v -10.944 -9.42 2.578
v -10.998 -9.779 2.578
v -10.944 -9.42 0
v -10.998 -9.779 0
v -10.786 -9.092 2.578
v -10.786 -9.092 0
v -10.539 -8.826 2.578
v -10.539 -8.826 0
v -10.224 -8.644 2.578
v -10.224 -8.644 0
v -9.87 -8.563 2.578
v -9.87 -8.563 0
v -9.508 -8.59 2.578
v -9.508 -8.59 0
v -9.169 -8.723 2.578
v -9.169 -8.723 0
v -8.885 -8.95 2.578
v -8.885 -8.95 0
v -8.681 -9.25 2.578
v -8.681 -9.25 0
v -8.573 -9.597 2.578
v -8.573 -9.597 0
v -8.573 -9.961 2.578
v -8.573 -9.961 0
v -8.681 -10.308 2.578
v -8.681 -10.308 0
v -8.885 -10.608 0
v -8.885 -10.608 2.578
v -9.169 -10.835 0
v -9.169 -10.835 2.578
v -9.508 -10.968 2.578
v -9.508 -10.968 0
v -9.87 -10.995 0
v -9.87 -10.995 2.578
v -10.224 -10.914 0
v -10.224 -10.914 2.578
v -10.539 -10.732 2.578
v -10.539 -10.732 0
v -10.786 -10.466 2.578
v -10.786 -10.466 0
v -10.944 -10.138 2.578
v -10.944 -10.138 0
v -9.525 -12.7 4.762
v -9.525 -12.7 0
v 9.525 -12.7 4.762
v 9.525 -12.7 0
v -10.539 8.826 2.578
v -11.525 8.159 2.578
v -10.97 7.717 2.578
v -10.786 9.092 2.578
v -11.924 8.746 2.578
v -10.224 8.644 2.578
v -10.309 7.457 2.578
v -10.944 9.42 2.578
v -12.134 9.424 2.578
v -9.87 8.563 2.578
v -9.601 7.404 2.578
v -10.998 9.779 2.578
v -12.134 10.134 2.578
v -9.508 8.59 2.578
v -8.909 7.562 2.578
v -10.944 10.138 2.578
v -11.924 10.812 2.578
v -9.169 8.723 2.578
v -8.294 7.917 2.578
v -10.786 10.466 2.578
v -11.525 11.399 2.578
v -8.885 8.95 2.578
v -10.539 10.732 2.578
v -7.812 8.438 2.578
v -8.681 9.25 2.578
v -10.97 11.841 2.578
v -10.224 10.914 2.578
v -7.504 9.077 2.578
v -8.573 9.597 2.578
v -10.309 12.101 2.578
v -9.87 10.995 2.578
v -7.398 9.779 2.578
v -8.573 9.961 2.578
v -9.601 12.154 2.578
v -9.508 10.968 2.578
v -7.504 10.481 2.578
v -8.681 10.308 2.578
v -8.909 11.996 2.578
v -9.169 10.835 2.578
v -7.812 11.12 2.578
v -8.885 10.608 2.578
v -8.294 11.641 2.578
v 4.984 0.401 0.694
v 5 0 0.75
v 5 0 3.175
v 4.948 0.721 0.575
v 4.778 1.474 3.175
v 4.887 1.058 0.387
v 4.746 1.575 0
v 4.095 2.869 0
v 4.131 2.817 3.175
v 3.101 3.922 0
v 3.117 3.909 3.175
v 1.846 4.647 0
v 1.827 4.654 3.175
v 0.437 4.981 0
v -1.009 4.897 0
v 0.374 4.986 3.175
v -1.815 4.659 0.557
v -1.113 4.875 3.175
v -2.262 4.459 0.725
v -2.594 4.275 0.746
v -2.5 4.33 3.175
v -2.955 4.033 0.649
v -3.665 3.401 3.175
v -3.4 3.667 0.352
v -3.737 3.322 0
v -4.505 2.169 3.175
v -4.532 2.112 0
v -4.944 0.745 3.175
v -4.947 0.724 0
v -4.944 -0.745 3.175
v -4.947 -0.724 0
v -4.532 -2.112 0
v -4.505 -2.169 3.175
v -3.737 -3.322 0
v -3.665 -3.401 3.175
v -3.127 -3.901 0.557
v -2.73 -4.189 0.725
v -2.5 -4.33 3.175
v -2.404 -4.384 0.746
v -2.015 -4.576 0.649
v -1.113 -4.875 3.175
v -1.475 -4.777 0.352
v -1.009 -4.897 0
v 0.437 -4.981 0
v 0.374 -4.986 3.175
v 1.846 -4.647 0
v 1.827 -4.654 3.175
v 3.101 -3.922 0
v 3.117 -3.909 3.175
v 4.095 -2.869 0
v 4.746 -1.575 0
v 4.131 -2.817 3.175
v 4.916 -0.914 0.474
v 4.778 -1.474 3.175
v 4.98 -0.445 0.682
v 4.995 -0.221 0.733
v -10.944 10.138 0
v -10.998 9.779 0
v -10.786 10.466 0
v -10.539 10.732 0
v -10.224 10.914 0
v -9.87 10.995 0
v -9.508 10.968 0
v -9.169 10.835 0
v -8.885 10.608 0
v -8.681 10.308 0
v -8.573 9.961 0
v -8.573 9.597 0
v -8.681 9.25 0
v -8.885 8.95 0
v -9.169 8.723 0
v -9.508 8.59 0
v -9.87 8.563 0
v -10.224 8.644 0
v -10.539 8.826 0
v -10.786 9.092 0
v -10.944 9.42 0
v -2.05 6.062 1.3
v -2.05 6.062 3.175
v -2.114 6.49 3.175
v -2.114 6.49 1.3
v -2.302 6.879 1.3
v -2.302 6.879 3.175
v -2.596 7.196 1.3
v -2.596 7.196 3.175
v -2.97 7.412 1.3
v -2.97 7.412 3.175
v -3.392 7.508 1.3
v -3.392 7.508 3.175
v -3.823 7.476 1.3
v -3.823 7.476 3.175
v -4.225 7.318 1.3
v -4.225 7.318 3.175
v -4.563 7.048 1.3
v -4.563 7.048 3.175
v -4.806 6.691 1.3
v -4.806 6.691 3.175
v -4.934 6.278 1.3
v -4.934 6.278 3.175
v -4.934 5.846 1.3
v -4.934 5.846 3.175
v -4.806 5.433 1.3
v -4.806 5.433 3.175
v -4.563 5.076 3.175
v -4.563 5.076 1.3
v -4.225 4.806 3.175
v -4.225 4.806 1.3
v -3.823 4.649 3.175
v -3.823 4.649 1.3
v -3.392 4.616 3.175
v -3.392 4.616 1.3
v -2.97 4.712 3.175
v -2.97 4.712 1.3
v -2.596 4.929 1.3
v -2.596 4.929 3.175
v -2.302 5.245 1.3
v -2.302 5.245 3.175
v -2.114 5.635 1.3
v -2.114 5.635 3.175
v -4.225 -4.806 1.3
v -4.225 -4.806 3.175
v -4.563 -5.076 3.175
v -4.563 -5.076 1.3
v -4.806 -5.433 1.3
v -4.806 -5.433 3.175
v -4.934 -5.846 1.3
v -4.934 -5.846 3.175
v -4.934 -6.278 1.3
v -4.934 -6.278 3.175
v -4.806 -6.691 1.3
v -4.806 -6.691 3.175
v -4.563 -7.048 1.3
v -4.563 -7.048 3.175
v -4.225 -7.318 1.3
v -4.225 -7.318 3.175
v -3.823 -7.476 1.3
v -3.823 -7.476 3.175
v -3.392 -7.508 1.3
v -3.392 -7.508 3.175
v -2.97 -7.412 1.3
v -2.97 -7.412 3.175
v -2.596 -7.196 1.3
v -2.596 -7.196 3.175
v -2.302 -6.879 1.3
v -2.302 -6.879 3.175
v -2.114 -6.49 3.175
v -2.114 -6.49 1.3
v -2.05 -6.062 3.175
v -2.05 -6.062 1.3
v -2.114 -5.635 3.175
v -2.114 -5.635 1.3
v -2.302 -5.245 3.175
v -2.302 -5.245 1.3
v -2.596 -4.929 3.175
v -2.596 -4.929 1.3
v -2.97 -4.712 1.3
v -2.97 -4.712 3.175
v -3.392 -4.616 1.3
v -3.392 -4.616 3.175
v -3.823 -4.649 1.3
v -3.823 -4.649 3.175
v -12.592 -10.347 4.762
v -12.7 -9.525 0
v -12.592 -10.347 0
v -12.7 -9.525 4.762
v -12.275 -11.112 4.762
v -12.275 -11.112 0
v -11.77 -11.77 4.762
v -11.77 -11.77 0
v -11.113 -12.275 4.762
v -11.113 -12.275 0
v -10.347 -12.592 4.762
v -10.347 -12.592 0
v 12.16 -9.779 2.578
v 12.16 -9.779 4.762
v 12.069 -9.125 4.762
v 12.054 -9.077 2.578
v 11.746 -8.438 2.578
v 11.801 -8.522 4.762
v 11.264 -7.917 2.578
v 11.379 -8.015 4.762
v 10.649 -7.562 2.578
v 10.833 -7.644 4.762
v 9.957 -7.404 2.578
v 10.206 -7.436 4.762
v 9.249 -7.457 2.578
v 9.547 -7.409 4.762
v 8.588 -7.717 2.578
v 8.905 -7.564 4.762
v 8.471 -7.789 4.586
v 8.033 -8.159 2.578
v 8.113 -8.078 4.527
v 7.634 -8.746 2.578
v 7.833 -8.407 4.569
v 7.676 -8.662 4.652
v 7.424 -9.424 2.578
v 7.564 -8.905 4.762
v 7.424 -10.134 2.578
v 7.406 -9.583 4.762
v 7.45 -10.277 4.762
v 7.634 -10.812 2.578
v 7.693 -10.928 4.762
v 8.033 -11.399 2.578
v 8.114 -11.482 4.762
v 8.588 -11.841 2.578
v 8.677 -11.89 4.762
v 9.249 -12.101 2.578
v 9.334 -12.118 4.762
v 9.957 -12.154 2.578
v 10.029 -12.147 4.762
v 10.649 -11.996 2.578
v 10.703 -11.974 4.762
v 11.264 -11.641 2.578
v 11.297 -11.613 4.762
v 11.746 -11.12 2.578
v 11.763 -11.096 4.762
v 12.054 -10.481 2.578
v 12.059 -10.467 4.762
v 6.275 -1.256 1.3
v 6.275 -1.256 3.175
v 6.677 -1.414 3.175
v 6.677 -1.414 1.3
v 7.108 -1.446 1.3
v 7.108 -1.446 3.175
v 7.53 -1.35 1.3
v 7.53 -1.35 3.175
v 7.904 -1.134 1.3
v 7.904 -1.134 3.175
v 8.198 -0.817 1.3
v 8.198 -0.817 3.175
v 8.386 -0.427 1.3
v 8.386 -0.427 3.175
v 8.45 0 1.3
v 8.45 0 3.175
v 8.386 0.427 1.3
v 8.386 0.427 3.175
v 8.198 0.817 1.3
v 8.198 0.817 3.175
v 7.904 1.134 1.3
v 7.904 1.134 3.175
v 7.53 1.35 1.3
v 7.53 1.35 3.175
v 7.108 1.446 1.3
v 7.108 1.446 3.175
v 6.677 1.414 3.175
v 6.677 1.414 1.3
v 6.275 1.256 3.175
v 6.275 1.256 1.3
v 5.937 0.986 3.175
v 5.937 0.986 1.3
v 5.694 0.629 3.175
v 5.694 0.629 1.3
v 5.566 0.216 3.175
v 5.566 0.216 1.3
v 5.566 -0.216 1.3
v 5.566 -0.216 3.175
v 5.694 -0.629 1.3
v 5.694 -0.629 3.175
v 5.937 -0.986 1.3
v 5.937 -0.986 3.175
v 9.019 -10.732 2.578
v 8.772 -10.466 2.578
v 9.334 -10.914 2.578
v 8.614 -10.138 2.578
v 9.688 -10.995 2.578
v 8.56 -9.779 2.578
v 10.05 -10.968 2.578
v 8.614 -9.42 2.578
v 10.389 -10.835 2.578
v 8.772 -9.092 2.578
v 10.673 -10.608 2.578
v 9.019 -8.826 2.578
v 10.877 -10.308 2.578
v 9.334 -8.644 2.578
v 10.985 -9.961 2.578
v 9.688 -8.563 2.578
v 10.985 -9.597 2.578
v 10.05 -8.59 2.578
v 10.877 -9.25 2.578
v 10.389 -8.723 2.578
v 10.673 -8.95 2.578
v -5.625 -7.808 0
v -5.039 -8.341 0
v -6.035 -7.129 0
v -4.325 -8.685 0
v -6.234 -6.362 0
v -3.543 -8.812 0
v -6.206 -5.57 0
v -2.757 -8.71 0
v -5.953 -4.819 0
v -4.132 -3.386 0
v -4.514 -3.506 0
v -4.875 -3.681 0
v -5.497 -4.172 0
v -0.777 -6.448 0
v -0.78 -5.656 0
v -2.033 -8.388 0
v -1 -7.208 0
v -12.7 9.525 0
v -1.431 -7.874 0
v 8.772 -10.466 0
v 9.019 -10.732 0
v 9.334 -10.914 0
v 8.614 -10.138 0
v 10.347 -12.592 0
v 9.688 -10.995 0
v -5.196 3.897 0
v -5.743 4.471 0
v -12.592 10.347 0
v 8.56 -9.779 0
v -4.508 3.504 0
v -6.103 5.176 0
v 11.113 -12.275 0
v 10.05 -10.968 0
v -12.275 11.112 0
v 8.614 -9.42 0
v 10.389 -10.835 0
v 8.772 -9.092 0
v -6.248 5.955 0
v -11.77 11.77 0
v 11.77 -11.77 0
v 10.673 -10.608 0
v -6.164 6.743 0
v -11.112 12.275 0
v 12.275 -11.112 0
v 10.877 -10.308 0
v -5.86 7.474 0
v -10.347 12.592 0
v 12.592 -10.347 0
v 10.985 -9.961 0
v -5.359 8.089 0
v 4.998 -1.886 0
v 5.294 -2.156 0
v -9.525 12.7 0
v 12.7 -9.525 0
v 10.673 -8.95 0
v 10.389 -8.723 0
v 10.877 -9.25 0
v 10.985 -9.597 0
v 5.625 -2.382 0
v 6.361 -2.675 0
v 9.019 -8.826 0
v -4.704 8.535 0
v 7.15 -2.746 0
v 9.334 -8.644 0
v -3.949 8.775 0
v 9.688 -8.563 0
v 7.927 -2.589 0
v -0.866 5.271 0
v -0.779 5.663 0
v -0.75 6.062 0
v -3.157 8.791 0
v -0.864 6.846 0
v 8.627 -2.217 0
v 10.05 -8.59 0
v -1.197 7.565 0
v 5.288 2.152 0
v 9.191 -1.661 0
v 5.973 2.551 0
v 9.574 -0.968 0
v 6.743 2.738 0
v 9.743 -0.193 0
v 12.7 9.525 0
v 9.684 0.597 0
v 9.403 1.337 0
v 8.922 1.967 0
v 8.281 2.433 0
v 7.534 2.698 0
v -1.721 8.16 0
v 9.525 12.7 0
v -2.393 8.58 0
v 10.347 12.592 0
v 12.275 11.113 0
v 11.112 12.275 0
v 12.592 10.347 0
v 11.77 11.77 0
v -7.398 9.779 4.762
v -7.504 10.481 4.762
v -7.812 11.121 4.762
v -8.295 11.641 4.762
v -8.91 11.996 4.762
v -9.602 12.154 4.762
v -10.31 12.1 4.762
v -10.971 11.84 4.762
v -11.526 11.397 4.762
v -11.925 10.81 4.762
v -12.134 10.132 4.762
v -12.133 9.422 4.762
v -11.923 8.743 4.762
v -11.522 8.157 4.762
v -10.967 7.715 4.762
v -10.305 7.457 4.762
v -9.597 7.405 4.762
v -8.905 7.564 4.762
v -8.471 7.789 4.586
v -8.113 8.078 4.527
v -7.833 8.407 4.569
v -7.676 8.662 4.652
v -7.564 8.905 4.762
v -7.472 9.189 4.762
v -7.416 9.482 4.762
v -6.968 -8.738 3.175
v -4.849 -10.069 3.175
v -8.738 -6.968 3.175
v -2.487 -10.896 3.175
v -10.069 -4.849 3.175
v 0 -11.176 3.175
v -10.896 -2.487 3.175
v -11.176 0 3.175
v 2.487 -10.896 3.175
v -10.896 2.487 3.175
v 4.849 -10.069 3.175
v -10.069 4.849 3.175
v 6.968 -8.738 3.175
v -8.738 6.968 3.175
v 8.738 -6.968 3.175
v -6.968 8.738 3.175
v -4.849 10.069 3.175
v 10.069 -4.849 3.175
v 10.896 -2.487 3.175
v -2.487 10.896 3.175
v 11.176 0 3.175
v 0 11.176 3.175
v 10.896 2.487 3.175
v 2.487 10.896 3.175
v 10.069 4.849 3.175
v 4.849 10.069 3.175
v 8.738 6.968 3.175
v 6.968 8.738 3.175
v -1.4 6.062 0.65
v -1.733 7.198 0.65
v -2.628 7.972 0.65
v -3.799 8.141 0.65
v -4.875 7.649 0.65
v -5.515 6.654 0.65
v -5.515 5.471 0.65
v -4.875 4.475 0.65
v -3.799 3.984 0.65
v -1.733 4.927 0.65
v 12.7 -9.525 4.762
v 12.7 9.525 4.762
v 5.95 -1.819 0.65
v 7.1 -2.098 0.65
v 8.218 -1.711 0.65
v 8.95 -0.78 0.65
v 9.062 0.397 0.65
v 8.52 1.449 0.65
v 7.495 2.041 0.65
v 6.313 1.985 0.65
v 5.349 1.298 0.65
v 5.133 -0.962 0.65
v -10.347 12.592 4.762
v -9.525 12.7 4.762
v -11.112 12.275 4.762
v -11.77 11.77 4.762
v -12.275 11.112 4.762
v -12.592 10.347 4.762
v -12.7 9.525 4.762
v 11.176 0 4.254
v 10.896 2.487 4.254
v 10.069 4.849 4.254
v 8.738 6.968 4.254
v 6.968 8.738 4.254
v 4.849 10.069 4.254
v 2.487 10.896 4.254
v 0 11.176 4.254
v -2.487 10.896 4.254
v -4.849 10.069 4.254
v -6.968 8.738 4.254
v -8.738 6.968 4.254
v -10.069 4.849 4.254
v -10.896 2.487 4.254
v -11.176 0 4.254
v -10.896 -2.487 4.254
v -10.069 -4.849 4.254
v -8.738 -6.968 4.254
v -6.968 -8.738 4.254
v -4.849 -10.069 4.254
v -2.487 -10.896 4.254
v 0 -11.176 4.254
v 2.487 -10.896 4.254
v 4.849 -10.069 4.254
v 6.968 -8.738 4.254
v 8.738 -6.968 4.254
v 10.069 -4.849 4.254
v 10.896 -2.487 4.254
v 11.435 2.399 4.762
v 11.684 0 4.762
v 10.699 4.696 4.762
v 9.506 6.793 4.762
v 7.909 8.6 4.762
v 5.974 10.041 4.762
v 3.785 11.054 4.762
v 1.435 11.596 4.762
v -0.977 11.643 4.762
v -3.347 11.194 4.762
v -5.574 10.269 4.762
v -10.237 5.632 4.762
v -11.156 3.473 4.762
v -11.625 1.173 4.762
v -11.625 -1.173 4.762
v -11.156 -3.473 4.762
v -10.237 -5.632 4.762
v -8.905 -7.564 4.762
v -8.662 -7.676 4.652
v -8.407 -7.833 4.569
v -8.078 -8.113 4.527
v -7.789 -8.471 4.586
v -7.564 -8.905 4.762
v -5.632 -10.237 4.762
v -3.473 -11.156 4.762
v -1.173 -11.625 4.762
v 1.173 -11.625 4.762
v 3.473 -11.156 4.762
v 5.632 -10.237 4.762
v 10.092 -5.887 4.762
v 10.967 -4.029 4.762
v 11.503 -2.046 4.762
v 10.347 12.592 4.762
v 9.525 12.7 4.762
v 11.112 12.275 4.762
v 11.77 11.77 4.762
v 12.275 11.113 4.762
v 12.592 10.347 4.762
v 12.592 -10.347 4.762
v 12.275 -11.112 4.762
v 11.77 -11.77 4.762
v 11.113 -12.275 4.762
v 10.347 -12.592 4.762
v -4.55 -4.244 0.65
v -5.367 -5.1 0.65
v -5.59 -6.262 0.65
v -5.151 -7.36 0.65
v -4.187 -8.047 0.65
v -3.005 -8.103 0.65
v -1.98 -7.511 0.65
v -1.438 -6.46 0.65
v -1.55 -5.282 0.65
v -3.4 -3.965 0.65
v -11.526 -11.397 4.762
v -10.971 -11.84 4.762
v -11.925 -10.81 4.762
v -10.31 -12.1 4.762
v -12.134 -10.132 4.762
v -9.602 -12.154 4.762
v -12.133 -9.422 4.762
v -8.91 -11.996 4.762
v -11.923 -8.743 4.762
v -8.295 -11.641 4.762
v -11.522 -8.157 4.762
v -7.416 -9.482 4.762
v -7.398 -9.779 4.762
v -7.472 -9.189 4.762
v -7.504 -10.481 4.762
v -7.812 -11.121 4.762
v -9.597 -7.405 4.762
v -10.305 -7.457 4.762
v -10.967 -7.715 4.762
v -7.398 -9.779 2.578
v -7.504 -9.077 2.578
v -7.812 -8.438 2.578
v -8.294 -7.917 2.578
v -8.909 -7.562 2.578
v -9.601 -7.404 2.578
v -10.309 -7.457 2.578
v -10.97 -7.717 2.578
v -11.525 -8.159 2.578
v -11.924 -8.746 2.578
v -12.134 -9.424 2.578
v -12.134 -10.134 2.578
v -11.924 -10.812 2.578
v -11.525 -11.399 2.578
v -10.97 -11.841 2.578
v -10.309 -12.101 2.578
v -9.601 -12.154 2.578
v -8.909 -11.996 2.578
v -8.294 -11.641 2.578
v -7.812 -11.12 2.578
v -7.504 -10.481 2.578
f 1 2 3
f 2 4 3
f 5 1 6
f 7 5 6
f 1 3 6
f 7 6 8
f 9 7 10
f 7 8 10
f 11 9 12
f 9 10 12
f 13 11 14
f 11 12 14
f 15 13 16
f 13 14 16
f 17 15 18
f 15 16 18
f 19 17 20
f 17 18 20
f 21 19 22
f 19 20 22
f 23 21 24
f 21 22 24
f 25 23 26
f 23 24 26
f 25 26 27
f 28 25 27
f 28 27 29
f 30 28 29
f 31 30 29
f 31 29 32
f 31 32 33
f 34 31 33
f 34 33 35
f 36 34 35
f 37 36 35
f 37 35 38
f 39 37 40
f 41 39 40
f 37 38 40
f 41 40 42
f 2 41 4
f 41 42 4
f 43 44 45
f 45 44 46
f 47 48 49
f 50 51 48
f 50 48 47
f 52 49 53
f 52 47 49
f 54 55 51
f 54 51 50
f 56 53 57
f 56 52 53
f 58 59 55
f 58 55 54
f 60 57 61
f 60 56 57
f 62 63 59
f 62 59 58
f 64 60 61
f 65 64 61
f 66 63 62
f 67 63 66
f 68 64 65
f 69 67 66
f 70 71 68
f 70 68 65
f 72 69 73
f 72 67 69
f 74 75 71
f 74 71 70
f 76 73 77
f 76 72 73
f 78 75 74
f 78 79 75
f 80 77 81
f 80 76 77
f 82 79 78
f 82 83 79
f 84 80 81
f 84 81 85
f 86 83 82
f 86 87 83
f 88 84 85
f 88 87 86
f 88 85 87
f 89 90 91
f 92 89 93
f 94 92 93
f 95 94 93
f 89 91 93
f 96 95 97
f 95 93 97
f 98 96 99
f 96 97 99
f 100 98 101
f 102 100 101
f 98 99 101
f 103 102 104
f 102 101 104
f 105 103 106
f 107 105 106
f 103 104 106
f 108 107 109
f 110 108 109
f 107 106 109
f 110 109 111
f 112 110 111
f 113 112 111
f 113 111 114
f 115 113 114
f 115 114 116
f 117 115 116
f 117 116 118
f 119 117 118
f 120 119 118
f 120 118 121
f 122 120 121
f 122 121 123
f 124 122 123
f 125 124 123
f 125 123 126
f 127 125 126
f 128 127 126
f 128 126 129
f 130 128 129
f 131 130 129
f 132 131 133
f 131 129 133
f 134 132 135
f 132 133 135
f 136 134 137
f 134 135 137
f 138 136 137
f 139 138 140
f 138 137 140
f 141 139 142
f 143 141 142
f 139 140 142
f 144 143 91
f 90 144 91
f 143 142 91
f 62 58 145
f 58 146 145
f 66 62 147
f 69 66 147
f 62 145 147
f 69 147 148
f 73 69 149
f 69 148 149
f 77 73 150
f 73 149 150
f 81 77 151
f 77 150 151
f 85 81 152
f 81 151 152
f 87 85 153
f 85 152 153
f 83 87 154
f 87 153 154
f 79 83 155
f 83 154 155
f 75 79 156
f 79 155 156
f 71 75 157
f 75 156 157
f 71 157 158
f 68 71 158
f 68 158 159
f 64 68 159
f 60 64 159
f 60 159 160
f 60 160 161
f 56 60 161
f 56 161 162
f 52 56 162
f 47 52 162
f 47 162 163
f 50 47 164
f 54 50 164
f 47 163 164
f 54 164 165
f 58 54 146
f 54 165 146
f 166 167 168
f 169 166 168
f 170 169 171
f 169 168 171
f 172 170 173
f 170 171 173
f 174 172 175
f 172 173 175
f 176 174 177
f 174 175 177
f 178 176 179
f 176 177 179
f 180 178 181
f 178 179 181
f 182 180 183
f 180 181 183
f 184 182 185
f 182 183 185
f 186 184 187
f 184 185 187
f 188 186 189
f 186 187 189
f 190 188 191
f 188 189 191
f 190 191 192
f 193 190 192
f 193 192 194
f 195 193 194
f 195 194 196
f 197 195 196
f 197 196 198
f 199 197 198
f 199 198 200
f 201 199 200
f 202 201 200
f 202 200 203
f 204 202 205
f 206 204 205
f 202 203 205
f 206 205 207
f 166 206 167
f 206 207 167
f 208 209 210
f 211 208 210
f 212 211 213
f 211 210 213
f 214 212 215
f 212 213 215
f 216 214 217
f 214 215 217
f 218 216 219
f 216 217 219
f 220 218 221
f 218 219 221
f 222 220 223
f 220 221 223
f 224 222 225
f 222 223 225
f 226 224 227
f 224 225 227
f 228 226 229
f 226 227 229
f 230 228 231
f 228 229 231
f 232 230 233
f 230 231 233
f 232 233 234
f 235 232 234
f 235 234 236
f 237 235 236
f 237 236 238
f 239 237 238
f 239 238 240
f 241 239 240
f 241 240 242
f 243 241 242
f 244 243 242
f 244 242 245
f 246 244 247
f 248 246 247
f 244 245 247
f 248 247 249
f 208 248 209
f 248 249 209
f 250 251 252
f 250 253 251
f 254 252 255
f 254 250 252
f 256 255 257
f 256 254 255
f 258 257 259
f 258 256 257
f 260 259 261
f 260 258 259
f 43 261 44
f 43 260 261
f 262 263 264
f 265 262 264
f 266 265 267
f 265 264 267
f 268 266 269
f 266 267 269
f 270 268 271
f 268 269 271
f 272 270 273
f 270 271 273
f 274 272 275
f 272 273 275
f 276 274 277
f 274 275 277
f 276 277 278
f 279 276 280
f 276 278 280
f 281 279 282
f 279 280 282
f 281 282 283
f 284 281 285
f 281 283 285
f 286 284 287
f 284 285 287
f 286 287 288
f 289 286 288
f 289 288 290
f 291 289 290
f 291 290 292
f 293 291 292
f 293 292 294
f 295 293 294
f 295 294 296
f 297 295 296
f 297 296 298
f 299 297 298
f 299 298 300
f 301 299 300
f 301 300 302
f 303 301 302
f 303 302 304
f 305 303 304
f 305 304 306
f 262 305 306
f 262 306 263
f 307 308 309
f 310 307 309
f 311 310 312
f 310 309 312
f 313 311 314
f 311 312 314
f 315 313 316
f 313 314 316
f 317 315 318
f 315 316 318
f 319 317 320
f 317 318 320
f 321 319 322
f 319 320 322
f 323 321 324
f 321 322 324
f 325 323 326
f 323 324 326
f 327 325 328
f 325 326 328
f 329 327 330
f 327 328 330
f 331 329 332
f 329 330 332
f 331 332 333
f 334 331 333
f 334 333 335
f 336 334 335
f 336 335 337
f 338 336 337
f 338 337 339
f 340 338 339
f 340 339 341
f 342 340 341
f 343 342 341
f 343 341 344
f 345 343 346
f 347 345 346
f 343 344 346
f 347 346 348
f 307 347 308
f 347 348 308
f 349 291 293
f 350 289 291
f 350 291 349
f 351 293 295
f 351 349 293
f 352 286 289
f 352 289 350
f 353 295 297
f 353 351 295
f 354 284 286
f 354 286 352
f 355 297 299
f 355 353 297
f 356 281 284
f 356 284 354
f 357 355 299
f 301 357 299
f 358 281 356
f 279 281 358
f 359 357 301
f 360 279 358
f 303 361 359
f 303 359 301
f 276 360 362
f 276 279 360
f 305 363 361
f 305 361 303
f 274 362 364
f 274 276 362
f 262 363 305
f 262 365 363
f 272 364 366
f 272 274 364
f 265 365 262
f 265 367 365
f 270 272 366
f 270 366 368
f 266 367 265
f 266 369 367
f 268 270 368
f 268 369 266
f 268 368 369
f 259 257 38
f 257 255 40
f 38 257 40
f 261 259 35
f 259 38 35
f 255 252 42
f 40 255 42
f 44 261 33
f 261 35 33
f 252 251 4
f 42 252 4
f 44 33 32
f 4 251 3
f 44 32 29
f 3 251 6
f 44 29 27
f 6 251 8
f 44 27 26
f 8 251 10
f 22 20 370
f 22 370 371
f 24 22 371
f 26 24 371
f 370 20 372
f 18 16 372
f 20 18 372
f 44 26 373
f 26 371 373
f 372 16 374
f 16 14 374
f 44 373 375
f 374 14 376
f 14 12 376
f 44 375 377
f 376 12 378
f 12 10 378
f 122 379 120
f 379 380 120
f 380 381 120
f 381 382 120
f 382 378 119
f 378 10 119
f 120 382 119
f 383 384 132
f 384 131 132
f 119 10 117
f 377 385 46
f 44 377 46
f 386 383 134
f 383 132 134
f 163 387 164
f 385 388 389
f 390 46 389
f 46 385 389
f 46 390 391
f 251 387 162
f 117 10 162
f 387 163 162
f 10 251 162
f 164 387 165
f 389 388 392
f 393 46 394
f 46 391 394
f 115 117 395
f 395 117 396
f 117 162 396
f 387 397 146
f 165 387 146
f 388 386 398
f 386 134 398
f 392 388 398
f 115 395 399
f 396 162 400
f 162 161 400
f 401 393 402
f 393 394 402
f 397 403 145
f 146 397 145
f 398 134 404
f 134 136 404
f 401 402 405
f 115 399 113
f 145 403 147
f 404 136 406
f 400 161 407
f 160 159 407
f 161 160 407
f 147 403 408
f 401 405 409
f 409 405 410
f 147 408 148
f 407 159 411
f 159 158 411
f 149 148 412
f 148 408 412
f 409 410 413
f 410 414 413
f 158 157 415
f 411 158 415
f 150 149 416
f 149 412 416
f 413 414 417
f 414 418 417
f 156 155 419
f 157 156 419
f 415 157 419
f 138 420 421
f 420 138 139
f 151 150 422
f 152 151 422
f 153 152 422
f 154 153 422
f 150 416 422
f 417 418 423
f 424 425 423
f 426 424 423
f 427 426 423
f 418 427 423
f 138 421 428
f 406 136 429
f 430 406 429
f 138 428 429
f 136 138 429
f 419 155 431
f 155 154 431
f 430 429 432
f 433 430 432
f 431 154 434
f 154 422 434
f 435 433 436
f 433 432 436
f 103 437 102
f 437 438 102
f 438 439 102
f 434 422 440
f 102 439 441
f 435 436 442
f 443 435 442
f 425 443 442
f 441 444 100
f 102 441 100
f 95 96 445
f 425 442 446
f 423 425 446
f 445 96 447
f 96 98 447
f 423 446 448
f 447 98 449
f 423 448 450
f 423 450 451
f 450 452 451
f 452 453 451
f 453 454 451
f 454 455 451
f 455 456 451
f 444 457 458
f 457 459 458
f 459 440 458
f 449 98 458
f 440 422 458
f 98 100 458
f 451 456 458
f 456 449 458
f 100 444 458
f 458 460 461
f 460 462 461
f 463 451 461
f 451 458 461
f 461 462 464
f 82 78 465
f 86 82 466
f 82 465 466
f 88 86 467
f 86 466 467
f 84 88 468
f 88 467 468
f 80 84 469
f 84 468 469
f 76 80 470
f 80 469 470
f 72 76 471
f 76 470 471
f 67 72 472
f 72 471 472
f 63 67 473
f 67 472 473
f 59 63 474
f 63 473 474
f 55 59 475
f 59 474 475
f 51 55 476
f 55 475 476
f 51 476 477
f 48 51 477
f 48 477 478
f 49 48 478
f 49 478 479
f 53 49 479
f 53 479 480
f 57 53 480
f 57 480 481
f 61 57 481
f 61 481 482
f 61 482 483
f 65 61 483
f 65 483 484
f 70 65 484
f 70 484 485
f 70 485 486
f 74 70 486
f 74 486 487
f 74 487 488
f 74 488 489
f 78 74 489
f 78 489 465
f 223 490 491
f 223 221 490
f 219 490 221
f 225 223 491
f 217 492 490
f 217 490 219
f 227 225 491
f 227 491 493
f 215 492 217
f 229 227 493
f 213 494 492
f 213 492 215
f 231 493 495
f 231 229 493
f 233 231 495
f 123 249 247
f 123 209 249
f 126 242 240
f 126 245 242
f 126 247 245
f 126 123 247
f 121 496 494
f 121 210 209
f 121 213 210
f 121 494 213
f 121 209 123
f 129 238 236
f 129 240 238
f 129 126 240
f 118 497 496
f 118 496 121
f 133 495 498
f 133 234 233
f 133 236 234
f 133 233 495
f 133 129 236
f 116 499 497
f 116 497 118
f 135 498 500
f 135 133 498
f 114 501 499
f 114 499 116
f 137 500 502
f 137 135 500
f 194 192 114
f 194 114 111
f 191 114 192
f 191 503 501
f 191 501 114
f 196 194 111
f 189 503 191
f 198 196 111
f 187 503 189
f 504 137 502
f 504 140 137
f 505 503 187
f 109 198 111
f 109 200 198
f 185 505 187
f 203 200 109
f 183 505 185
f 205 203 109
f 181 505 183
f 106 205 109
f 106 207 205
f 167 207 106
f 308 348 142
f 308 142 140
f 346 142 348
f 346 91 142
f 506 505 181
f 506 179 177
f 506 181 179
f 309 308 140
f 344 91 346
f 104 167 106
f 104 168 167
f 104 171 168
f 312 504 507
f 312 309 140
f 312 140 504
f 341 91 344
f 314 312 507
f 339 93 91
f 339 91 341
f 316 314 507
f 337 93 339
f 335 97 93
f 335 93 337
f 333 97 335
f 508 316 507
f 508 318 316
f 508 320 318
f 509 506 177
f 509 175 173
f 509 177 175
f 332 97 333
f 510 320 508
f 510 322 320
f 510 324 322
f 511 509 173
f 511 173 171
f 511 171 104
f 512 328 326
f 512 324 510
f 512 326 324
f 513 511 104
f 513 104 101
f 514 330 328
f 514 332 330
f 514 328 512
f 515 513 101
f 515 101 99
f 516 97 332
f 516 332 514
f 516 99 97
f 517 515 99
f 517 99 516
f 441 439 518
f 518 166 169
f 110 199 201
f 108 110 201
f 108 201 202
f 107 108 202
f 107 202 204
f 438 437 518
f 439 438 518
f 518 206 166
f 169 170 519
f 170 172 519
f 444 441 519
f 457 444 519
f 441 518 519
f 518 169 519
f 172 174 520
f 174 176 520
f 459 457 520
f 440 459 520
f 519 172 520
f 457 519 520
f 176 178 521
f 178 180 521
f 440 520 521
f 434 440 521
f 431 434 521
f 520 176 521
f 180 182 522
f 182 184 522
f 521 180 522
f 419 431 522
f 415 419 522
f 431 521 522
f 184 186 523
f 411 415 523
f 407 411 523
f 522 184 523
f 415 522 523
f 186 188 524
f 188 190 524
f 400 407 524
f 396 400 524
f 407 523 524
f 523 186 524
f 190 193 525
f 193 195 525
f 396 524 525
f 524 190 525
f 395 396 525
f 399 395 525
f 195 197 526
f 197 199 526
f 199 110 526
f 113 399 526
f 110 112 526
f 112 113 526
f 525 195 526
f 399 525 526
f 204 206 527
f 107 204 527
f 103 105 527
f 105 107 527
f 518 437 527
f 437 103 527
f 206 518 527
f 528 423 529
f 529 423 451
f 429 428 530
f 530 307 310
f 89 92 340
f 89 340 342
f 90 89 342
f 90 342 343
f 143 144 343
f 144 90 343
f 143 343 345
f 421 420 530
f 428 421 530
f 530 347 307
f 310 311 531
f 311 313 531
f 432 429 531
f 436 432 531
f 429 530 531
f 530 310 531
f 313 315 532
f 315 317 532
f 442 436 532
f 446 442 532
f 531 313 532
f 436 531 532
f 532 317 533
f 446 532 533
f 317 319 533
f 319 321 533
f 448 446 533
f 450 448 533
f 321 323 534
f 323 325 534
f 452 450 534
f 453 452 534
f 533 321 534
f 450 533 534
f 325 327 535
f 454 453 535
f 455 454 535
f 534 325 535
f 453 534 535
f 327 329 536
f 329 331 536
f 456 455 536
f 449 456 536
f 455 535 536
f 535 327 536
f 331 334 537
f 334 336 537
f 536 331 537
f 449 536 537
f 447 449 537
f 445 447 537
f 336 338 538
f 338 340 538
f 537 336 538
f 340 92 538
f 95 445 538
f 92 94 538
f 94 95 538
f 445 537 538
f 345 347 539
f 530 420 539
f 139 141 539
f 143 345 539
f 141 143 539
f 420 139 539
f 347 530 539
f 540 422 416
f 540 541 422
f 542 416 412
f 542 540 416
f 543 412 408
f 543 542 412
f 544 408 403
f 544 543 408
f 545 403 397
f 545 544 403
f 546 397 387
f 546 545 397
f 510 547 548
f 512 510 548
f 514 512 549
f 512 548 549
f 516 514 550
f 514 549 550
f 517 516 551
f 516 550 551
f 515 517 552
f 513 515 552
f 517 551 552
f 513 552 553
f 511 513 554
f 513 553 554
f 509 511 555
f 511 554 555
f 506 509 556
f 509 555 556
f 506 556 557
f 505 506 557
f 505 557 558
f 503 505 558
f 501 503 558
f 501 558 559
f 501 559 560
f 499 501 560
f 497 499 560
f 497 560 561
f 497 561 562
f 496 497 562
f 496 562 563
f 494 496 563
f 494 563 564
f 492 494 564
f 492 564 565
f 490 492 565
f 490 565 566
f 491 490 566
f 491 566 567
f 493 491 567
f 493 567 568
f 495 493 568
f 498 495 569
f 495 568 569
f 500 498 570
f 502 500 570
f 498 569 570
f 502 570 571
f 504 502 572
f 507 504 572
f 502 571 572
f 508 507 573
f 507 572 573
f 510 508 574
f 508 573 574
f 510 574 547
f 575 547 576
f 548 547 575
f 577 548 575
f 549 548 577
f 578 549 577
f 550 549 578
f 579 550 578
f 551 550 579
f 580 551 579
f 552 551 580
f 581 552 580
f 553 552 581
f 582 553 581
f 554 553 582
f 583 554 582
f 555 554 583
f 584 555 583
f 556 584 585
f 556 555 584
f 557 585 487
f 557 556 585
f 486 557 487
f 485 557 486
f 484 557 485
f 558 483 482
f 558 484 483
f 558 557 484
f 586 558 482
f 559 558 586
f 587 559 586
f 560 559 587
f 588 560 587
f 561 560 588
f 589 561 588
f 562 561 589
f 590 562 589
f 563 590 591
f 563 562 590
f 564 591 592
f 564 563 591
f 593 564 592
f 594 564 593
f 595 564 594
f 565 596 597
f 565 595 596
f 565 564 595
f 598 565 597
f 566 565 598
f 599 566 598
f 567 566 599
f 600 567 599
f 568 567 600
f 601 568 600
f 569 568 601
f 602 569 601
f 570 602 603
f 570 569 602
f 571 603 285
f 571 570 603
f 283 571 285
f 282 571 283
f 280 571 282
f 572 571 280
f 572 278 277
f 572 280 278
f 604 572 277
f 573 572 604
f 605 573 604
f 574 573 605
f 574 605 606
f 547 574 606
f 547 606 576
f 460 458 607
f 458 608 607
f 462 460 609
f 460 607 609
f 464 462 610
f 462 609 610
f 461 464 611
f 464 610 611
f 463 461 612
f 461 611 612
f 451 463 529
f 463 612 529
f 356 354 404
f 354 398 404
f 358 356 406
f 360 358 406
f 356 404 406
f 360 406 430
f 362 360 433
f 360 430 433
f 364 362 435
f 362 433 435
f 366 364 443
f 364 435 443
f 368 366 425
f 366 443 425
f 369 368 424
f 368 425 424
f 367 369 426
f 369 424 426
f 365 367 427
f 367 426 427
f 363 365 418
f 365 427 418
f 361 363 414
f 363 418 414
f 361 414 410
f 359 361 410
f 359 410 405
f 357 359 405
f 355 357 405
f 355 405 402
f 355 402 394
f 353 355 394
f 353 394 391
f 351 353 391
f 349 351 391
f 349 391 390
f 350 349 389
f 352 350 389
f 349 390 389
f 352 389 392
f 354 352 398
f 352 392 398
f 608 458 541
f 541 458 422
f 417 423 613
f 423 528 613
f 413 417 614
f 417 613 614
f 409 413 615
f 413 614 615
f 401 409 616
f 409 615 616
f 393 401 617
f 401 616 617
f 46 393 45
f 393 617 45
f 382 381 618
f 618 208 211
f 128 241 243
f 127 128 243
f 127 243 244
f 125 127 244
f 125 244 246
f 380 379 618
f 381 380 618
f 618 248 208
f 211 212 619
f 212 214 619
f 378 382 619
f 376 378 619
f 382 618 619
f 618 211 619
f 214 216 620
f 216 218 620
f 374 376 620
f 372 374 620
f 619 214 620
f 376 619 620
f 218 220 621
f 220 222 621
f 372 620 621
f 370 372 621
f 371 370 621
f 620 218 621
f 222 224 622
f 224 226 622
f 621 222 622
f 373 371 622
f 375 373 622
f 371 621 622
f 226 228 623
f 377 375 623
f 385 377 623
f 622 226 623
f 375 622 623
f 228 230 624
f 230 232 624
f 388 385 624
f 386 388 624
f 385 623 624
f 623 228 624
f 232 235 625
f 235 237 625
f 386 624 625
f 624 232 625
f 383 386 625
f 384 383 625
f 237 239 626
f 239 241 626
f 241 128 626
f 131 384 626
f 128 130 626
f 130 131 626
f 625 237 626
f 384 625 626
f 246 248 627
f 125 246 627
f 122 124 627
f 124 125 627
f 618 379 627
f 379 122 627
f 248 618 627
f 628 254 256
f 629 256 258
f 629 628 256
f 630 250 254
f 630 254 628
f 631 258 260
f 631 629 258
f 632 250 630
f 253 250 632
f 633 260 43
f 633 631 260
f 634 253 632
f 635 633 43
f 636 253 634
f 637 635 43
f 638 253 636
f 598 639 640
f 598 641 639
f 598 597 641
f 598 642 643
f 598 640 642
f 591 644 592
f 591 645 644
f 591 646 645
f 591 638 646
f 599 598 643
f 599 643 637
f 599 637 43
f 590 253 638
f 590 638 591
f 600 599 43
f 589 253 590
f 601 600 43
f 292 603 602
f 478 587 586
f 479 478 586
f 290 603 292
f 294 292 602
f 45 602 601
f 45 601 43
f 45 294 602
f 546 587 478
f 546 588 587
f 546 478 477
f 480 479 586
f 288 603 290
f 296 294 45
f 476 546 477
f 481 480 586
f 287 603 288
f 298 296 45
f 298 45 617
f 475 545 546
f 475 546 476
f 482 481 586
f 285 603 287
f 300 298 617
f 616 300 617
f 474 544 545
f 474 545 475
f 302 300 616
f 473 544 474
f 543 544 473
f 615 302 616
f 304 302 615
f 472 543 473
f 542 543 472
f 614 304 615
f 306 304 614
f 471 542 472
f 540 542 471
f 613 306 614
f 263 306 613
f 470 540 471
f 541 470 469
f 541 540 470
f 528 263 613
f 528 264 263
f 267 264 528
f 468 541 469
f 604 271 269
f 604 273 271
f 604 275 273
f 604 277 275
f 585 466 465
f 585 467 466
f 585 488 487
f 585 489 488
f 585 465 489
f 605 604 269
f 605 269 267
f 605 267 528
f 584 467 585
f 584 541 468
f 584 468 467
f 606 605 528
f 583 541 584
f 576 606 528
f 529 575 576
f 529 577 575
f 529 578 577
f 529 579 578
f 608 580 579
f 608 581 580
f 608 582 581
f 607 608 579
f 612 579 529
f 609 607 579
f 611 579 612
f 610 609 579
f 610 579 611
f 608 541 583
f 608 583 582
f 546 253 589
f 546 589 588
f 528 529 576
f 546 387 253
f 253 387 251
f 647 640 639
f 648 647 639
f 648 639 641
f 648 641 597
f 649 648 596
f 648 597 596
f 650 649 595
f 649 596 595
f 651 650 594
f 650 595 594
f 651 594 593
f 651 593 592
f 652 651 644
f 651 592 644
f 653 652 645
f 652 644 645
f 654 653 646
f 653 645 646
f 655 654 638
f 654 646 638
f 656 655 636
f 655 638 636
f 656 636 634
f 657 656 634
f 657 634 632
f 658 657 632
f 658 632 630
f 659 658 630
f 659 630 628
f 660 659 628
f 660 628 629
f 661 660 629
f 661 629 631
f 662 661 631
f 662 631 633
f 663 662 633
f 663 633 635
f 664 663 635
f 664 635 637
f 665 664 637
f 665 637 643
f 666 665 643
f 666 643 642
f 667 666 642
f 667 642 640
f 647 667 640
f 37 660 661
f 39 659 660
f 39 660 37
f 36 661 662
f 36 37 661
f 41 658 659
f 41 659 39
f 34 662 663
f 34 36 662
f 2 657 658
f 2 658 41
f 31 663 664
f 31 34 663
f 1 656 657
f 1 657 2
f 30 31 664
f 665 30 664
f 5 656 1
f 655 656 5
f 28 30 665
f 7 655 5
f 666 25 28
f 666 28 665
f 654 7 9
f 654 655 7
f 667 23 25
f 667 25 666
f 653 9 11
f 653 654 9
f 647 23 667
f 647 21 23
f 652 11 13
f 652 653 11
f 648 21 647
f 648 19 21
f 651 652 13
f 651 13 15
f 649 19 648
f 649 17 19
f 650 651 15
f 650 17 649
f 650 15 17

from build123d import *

# Parameters (mm, degrees)
BOSS_EXTRUDE2_DEPTH                               = 4.7625
SKETCH9_R                                         = 5
CUT_EXTRUDE1_DEPTH                                = 19.581211108
CSK_FOR_M2_5_FLAT_HEAD_MACHINE_SCREW1_D           = 2.9
CSK_FOR_M2_5_FLAT_HEAD_MACHINE_SCREW1_CSINK_D     = 5.5
CSK_FOR_M2_5_FLAT_HEAD_MACHINE_SCREW1_CSINK_ANGLE = 90
CBORE_FOR_2_SOCKET_HEAD_CAP_SCREW1_D              = 2.4384
CBORE_FOR_2_SOCKET_HEAD_CAP_SCREW1_CBORE_D        = 4.7625
CBORE_FOR_2_SOCKET_HEAD_CAP_SCREW1_CBORE_DEPTH    = 2.1844
FILLET1_R                                         = 3.175
CIRPATTERN1_COUNT                                 = 3
SKETCH10_R                                        = 11.176
CUT_EXTRUDE2_DEPTH                                = 1.5875
CHAMFER1_SIZE                                     = 0.508


with BuildPart() as part:
    # Sketch1 → Boss-Extrude2 (new body)
    with BuildSketch(Plane.XY):
        Polygon((12.7, 12.7), (-12.7, 12.7), (0, 0), align=None)
        Polygon((-12.7, 12.7), (-12.7, -12.7), (0, 0), align=None)
        Polygon((0, 0), (-12.7, -12.7), (12.7, -12.7), align=None)
        Polygon((0, 0), (12.7, -12.7), (12.7, 12.7), align=None)
    extrude(amount=BOSS_EXTRUDE2_DEPTH)

    # Sketch9 → Cut-Extrude1 (cut, through all)
    with BuildSketch(Plane.XY.offset(4.7625)):
        Circle(SKETCH9_R)
    extrude(amount=-CUT_EXTRUDE1_DEPTH, mode=Mode.SUBTRACT)

    # CSK for M2.5 Flat Head Machine Screw1 (through all)
    with Locations(Plane(origin=(0, 0, 0), x_dir=(-1, 0, 0), z_dir=(0, 0, -1))):
        with Locations((3.5, 6.062177826)):
            csk_for_m2_5_flat_head_machine_screw1 = CounterSinkHole(CSK_FOR_M2_5_FLAT_HEAD_MACHINE_SCREW1_D / 2, CSK_FOR_M2_5_FLAT_HEAD_MACHINE_SCREW1_CSINK_D / 2, counter_sink_angle=CSK_FOR_M2_5_FLAT_HEAD_MACHINE_SCREW1_CSINK_ANGLE)

    # CBORE for #2 Socket Head Cap Screw1 (through all)
    with Locations(Plane.XY.offset(4.7625)):
        with Locations((0, 0), (-9.779, -9.779), (9.779, -9.779), (-9.779, 9.779)):
            CounterBoreHole(CBORE_FOR_2_SOCKET_HEAD_CAP_SCREW1_D / 2, CBORE_FOR_2_SOCKET_HEAD_CAP_SCREW1_CBORE_D / 2, CBORE_FOR_2_SOCKET_HEAD_CAP_SCREW1_CBORE_DEPTH)

    # Fillet1
    fillet1_edges = [part.edges().sort_by_distance(p)[0] for p in [
        (12.7, 12.7, 2.38125),
        (12.7, -12.7, 2.38125),
        (-12.7, -12.7, 2.38125),
        (-12.7, 12.7, 2.38125),
    ]]
    fillet(fillet1_edges, radius=FILLET1_R)

    # CirPattern1: CSK for M2.5 Flat Head Machine Screw1 ×3 about axis
    cirpattern1_axis = Axis((0, 0, 0), (0, 0, 1))
    for i in range(1, CIRPATTERN1_COUNT):
        add(csk_for_m2_5_flat_head_machine_screw1.rotate(cirpattern1_axis, i * 360 / CIRPATTERN1_COUNT), mode=Mode.SUBTRACT)

    # Sketch10 → Cut-Extrude2 (cut)
    with BuildSketch(Plane.XY.offset(4.7625)):
        Circle(SKETCH10_R)
    extrude(amount=-CUT_EXTRUDE2_DEPTH, mode=Mode.SUBTRACT)

    # Chamfer1
    # the kernel refuses this chamfer: 0.508 mm, written as the material it takes off along each edge
    with BuildSketch(Plane(origin=(0, 0, 4.7625), x_dir=(1, 0, 0), z_dir=(0, -1, 0))) as chamfer1_piece_1:
        Polygon((11.176 + CHAMFER1_SIZE, 0), (11.176, -CHAMFER1_SIZE), (11.176, 0), align=None)
    revolve(axis=Axis((0, 0, 4.7625), (0, 0, 1)), mode=Mode.SUBTRACT)


solid = part.part
